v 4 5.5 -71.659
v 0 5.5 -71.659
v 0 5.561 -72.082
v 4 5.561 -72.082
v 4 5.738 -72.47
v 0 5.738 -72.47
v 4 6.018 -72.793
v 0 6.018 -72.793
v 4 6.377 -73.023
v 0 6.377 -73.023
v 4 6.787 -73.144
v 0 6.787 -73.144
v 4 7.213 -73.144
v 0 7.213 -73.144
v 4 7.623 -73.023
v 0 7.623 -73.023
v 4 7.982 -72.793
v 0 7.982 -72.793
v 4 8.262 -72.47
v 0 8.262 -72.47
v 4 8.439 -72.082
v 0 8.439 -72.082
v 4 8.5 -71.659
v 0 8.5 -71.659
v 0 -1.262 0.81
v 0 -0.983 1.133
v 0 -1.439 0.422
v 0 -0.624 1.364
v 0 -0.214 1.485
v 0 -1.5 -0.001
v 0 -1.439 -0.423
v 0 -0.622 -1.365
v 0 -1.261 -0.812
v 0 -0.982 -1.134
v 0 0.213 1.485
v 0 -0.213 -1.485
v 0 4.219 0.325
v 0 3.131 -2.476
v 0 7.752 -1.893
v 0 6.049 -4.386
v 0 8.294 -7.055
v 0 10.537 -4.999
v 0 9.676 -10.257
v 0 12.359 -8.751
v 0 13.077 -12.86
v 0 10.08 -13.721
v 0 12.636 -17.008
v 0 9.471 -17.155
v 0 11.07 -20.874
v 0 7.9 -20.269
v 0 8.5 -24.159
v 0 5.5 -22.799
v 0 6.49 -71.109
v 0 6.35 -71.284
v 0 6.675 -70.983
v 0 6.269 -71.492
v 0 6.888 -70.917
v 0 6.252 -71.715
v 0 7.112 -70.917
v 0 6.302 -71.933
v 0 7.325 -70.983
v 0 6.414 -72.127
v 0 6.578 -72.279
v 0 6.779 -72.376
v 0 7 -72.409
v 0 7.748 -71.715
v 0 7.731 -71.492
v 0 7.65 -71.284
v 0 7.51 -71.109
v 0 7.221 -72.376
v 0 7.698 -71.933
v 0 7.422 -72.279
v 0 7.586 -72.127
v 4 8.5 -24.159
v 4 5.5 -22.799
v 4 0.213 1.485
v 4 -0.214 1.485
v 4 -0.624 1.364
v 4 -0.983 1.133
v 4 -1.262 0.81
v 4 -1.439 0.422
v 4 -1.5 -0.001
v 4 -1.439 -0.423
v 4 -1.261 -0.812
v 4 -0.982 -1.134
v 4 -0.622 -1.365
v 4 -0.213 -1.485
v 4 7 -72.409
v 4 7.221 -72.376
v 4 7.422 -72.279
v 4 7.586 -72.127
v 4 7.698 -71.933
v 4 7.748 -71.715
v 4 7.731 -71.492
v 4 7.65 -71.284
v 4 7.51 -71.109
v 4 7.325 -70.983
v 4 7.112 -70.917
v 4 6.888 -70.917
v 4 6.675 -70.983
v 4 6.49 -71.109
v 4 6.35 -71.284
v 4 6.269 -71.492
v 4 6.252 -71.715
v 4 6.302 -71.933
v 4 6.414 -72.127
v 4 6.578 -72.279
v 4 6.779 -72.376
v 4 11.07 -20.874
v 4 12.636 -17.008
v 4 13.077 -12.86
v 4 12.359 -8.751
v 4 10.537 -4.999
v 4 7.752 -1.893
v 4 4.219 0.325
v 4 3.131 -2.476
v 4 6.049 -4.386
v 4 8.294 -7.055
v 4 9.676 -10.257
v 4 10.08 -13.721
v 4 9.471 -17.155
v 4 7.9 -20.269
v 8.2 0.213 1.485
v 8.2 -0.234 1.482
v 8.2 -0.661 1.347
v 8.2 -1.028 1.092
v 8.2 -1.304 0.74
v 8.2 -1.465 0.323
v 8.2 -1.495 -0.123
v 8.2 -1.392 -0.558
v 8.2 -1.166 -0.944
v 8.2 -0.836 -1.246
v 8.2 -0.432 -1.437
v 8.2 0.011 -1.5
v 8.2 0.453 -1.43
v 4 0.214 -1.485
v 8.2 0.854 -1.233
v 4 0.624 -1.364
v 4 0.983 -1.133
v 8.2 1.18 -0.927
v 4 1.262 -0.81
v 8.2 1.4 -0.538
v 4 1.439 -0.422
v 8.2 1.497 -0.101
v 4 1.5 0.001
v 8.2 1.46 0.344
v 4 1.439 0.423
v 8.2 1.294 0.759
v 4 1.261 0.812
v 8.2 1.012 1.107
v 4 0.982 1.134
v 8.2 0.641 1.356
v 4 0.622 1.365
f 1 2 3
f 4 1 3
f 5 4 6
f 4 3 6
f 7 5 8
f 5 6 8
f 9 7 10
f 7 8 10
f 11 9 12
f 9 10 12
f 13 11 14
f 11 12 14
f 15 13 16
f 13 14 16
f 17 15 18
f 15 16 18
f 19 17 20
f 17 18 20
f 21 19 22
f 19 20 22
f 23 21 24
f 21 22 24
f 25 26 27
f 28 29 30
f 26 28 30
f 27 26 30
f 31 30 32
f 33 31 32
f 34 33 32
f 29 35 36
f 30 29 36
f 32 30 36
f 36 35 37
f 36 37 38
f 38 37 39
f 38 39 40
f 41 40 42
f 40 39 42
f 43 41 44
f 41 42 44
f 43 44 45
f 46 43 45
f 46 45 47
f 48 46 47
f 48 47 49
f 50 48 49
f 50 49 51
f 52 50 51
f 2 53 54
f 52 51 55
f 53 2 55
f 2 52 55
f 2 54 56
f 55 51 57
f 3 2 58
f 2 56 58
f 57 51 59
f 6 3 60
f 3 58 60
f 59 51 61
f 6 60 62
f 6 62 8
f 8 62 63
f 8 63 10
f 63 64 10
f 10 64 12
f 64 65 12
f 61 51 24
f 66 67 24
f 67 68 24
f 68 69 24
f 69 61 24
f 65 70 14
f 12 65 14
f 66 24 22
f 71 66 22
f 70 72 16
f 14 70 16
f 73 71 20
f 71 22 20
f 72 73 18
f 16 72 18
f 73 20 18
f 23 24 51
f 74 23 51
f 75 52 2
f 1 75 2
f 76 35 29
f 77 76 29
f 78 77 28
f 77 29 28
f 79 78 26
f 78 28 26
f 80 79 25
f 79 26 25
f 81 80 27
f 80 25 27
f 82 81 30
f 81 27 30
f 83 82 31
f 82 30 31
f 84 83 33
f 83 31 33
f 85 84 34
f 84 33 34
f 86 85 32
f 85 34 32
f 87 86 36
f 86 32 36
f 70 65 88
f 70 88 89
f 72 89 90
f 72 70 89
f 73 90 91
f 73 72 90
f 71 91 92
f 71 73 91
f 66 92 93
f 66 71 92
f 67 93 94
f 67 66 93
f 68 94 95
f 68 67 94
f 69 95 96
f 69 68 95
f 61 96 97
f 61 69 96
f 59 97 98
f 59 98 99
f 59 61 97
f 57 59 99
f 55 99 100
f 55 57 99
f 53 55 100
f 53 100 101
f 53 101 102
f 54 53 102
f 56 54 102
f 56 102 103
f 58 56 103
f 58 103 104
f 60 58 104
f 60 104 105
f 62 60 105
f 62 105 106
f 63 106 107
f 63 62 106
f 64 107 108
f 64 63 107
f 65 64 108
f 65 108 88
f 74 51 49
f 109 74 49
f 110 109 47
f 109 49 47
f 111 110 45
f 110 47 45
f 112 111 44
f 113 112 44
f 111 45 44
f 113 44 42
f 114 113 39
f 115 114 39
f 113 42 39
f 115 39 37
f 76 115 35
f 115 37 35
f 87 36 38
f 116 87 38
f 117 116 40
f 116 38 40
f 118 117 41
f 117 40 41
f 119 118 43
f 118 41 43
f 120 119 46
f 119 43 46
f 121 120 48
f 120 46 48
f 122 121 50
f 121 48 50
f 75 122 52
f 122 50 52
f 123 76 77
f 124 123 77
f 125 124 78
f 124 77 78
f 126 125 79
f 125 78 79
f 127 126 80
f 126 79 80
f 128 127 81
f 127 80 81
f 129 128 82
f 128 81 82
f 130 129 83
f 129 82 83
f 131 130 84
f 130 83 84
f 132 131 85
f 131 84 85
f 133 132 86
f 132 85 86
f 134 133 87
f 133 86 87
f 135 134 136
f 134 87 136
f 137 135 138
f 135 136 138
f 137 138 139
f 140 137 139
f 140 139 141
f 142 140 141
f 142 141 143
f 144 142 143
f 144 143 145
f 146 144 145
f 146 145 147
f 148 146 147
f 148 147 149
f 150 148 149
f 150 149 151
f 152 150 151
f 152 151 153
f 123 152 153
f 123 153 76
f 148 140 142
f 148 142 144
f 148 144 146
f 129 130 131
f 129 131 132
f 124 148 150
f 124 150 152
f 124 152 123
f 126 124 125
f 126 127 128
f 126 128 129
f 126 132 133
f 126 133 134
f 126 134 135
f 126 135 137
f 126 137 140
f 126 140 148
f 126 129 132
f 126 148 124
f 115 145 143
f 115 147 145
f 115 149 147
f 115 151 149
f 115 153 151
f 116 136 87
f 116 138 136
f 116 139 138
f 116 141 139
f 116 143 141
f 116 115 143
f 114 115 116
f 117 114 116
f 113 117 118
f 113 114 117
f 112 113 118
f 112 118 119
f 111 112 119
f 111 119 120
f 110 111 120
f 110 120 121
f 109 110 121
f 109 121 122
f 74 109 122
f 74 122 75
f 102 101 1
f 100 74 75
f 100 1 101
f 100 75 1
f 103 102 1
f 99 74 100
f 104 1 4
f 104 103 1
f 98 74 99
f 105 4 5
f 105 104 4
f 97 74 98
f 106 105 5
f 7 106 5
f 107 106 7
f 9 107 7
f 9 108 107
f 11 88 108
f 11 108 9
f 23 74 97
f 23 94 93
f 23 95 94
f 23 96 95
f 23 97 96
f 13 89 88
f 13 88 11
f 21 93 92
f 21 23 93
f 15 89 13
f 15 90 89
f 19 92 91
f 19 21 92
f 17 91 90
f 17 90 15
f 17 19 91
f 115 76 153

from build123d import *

# Parameters (mm, degrees)
SKETCH1_R           = 0.75
BOSS_EXTRUDE1_DEPTH = 4
SKETCH2_R           = 1.5
BOSS_EXTRUDE2_DEPTH = 4.2


with BuildPart() as part:
    # Sketch1 → Boss-Extrude1 (new body)
    with BuildSketch(Plane(origin=(0, 0, 0), x_dir=(0, 0, -1), z_dir=(1, 0, 0))):
        with BuildLine():
            Line((71.658914309, 8.5), (24.158914309, 8.5))
            ThreePointArc((24.158914309, 8.5), (8.750910997, 12.358734302), (-1.484840821, 0.212715152))
            ThreePointArc((-1.484840821, 0.212715152), (-0.212715152, -1.484840821), (1.484840821, -0.212715152))
            ThreePointArc((1.484840821, -0.212715152), (10.256916266, 9.676453105), (22.798933484, 5.5))
            Line((22.798933484, 5.5), (71.658914309, 5.5))
            ThreePointArc((71.658914309, 5.5), (73.158914309, 7), (71.658914309, 8.5))
        make_face()
        with Locations((71.658914309, 7)):
            Circle(SKETCH1_R, mode=Mode.SUBTRACT)
    extrude(amount=BOSS_EXTRUDE1_DEPTH)

    # Sketch2 → Boss-Extrude2 (add)
    with BuildSketch(Plane(origin=(4, 0, 0), x_dir=(0, 0, -1), z_dir=(1, 0, 0))):
        with Locations(Location((0, 0, 0), (0, 0, 171.847397423))):
            Circle(SKETCH2_R)
    extrude(amount=BOSS_EXTRUDE2_DEPTH)


solid = part.part
